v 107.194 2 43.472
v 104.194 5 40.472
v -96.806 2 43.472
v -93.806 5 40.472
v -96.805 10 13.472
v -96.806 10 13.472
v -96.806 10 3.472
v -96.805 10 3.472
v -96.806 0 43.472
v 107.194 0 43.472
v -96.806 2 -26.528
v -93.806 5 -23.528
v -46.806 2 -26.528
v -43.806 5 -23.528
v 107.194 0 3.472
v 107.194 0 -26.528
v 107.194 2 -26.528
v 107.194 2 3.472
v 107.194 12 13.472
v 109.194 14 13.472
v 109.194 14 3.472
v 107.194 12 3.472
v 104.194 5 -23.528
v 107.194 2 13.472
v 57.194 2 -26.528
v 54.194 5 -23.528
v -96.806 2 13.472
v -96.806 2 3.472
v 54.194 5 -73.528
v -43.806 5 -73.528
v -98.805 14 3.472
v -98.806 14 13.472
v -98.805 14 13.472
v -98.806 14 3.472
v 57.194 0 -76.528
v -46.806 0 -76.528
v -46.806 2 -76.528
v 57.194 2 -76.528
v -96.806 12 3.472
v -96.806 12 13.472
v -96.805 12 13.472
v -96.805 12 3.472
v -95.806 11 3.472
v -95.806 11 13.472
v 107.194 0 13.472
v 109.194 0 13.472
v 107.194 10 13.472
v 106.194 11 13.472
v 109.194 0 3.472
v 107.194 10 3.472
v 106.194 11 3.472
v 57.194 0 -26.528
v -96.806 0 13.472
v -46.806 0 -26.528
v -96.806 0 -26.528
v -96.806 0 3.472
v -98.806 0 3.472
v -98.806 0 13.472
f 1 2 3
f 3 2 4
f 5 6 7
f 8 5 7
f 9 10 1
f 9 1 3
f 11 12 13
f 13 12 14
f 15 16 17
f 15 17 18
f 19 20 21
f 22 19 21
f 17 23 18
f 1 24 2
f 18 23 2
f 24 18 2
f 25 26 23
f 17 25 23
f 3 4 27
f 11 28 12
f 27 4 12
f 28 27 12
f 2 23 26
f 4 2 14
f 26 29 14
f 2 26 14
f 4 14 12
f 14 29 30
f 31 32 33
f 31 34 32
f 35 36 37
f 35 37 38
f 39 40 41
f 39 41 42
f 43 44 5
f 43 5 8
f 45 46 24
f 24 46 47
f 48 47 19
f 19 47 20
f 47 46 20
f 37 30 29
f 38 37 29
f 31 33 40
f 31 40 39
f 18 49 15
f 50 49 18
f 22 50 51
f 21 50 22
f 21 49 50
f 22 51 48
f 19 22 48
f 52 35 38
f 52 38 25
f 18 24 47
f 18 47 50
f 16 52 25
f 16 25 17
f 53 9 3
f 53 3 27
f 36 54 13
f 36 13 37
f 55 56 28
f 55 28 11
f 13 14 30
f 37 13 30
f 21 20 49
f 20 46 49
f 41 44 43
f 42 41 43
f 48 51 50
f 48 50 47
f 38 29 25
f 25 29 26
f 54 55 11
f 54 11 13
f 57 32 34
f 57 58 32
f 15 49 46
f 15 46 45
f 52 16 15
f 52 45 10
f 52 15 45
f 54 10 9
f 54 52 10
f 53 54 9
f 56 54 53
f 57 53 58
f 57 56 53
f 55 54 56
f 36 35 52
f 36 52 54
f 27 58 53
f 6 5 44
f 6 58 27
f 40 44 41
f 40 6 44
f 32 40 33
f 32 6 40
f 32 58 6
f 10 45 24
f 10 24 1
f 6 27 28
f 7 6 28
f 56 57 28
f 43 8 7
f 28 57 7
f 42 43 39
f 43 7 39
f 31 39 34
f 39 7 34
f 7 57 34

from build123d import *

# Parameters (mm, degrees)
BOSS_EXTRUDE1_DEPTH = 5
CHAMFER1_SIZE       = 3
SKETCH4_W           = 10
SKETCH4_H           = 2
BOSS_EXTRUDE3_DEPTH = 2
SKETCH5_W           = 2
SKETCH5_H           = 10
BOSS_EXTRUDE4_DEPTH = 12
CHAMFER2_SIZE       = 2
SKETCH6_W           = 10
SKETCH6_H           = 2
BOSS_EXTRUDE5_DEPTH = 1
CHAMFER3_SIZE       = 1
SKETCH7_W           = 10
SKETCH7_H           = 2
BOSS_EXTRUDE6_DEPTH = 2
SKETCH8_W           = 2
SKETCH8_H           = 10
BOSS_EXTRUDE7_DEPTH = 12
CHAMFER4_SIZE       = 2
SKETCH9_W           = 10
SKETCH9_H           = 2
BOSS_EXTRUDE8_DEPTH = 1
CHAMFER5_SIZE       = 1


with BuildPart() as part:
    # Sketch1 → Boss-Extrude1 (new body)
    with BuildSketch(Plane(origin=(0, 0, 0), x_dir=(1, 0, 0), z_dir=(0, 1, 0))):
        Polygon((-96.805555556, 26.527777778), (-46.805555556, 26.527777778), (-46.805555556, 76.527777778), (57.194444444, 76.527777778), (57.194444444, 26.527777778), (107.194444444, 26.527777778), (107.194444444, -43.472222222), (-96.805555556, -43.472222222), align=None)
    extrude(amount=BOSS_EXTRUDE1_DEPTH)

    # Chamfer1
    chamfer1_edges = [part.edges().sort_by_distance(p)[0] for p in [
        (107.194444444, 5, 8.472222222),
        (82.194444444, 5, -26.527777778),
        (57.194444444, 5, -51.527777778),
        (5.194444444, 5, -76.527777778),
        (-46.805555556, 5, -51.527777778),
        (-71.805555556, 5, -26.527777778),
        (-96.805555556, 5, 8.472222222),
        (5.194444444, 5, 43.472222222),
    ]]
    chamfer(chamfer1_edges, length=CHAMFER1_SIZE)

    # Sketch4 → Boss-Extrude3 (add)
    with BuildSketch(Plane(origin=(107.194444444, 0, 0), x_dir=(0, 0, -1), z_dir=(1, 0, 0))):
        with Locations((-8.472222222, 1)):
            Rectangle(SKETCH4_W, SKETCH4_H)
    extrude(amount=BOSS_EXTRUDE3_DEPTH)

    # Sketch5 → Boss-Extrude4 (add)
    with BuildSketch(Plane(origin=(0, 2, 0), x_dir=(1, 0, 0), z_dir=(0, 1, 0))):
        with Locations((108.194444444, -8.472222222)):
            Rectangle(SKETCH5_W, SKETCH5_H)
    extrude(amount=BOSS_EXTRUDE4_DEPTH)

    # Chamfer2
    chamfer2_edges = [part.edges().sort_by_distance(p)[0] for p in [
        (107.194444444, 14, 8.472222222),
    ]]
    chamfer(chamfer2_edges, length=CHAMFER2_SIZE - 0.0001)  # a hair under: the kernel refuses the full size

    # Sketch6 → Boss-Extrude5 (add)
    with BuildSketch(Plane.ZY.offset(-107.194444444)):
        with Locations((8.472222222, 11)):
            Rectangle(SKETCH6_W, SKETCH6_H)
    extrude(amount=BOSS_EXTRUDE5_DEPTH)

    # Chamfer3
    chamfer3_edges = [part.edges().sort_by_distance(p)[0] for p in [
        (106.194444444, 10, 8.472222222),
        (106.194444444, 12, 8.472222222),
    ]]
    chamfer(chamfer3_edges, length=CHAMFER3_SIZE - 0.0001)  # a hair under: the kernel refuses the full size

    # Sketch7 → Boss-Extrude6 (add)
    with BuildSketch(Plane.ZY.offset(96.805555556)):
        with Locations((8.472222222, 1)):
            Rectangle(SKETCH7_W, SKETCH7_H)
    extrude(amount=BOSS_EXTRUDE6_DEPTH)

    # Sketch8 → Boss-Extrude7 (add)
    with BuildSketch(Plane(origin=(0, 2, 0), x_dir=(1, 0, 0), z_dir=(0, 1, 0))):
        with Locations((-97.805555556, -8.472222222)):
            Rectangle(SKETCH8_W, SKETCH8_H)
    extrude(amount=BOSS_EXTRUDE7_DEPTH)

    # Chamfer4
    chamfer4_edges = [part.edges().sort_by_distance(p)[0] for p in [
        (-96.805555556, 14, 8.472222222),
    ]]
    chamfer(chamfer4_edges, length=CHAMFER4_SIZE - 0.0001)  # a hair under: the kernel refuses the full size

    # Sketch9 → Boss-Extrude8 (add)
    with BuildSketch(Plane(origin=(-96.805555556, 0, 0), x_dir=(0, 0, -1), z_dir=(1, 0, 0))):
        with Locations((-8.472222222, 11)):
            Rectangle(SKETCH9_W, SKETCH9_H)
    extrude(amount=BOSS_EXTRUDE8_DEPTH)

    # Chamfer5
    chamfer5_edges = [part.edges().sort_by_distance(p)[0] for p in [
        (-95.805555556, 10, 8.472222222),
        (-95.805555556, 12, 8.472222222),
    ]]
    chamfer(chamfer5_edges, length=CHAMFER5_SIZE - 0.0001)  # a hair under: the kernel refuses the full size


solid = part.part
